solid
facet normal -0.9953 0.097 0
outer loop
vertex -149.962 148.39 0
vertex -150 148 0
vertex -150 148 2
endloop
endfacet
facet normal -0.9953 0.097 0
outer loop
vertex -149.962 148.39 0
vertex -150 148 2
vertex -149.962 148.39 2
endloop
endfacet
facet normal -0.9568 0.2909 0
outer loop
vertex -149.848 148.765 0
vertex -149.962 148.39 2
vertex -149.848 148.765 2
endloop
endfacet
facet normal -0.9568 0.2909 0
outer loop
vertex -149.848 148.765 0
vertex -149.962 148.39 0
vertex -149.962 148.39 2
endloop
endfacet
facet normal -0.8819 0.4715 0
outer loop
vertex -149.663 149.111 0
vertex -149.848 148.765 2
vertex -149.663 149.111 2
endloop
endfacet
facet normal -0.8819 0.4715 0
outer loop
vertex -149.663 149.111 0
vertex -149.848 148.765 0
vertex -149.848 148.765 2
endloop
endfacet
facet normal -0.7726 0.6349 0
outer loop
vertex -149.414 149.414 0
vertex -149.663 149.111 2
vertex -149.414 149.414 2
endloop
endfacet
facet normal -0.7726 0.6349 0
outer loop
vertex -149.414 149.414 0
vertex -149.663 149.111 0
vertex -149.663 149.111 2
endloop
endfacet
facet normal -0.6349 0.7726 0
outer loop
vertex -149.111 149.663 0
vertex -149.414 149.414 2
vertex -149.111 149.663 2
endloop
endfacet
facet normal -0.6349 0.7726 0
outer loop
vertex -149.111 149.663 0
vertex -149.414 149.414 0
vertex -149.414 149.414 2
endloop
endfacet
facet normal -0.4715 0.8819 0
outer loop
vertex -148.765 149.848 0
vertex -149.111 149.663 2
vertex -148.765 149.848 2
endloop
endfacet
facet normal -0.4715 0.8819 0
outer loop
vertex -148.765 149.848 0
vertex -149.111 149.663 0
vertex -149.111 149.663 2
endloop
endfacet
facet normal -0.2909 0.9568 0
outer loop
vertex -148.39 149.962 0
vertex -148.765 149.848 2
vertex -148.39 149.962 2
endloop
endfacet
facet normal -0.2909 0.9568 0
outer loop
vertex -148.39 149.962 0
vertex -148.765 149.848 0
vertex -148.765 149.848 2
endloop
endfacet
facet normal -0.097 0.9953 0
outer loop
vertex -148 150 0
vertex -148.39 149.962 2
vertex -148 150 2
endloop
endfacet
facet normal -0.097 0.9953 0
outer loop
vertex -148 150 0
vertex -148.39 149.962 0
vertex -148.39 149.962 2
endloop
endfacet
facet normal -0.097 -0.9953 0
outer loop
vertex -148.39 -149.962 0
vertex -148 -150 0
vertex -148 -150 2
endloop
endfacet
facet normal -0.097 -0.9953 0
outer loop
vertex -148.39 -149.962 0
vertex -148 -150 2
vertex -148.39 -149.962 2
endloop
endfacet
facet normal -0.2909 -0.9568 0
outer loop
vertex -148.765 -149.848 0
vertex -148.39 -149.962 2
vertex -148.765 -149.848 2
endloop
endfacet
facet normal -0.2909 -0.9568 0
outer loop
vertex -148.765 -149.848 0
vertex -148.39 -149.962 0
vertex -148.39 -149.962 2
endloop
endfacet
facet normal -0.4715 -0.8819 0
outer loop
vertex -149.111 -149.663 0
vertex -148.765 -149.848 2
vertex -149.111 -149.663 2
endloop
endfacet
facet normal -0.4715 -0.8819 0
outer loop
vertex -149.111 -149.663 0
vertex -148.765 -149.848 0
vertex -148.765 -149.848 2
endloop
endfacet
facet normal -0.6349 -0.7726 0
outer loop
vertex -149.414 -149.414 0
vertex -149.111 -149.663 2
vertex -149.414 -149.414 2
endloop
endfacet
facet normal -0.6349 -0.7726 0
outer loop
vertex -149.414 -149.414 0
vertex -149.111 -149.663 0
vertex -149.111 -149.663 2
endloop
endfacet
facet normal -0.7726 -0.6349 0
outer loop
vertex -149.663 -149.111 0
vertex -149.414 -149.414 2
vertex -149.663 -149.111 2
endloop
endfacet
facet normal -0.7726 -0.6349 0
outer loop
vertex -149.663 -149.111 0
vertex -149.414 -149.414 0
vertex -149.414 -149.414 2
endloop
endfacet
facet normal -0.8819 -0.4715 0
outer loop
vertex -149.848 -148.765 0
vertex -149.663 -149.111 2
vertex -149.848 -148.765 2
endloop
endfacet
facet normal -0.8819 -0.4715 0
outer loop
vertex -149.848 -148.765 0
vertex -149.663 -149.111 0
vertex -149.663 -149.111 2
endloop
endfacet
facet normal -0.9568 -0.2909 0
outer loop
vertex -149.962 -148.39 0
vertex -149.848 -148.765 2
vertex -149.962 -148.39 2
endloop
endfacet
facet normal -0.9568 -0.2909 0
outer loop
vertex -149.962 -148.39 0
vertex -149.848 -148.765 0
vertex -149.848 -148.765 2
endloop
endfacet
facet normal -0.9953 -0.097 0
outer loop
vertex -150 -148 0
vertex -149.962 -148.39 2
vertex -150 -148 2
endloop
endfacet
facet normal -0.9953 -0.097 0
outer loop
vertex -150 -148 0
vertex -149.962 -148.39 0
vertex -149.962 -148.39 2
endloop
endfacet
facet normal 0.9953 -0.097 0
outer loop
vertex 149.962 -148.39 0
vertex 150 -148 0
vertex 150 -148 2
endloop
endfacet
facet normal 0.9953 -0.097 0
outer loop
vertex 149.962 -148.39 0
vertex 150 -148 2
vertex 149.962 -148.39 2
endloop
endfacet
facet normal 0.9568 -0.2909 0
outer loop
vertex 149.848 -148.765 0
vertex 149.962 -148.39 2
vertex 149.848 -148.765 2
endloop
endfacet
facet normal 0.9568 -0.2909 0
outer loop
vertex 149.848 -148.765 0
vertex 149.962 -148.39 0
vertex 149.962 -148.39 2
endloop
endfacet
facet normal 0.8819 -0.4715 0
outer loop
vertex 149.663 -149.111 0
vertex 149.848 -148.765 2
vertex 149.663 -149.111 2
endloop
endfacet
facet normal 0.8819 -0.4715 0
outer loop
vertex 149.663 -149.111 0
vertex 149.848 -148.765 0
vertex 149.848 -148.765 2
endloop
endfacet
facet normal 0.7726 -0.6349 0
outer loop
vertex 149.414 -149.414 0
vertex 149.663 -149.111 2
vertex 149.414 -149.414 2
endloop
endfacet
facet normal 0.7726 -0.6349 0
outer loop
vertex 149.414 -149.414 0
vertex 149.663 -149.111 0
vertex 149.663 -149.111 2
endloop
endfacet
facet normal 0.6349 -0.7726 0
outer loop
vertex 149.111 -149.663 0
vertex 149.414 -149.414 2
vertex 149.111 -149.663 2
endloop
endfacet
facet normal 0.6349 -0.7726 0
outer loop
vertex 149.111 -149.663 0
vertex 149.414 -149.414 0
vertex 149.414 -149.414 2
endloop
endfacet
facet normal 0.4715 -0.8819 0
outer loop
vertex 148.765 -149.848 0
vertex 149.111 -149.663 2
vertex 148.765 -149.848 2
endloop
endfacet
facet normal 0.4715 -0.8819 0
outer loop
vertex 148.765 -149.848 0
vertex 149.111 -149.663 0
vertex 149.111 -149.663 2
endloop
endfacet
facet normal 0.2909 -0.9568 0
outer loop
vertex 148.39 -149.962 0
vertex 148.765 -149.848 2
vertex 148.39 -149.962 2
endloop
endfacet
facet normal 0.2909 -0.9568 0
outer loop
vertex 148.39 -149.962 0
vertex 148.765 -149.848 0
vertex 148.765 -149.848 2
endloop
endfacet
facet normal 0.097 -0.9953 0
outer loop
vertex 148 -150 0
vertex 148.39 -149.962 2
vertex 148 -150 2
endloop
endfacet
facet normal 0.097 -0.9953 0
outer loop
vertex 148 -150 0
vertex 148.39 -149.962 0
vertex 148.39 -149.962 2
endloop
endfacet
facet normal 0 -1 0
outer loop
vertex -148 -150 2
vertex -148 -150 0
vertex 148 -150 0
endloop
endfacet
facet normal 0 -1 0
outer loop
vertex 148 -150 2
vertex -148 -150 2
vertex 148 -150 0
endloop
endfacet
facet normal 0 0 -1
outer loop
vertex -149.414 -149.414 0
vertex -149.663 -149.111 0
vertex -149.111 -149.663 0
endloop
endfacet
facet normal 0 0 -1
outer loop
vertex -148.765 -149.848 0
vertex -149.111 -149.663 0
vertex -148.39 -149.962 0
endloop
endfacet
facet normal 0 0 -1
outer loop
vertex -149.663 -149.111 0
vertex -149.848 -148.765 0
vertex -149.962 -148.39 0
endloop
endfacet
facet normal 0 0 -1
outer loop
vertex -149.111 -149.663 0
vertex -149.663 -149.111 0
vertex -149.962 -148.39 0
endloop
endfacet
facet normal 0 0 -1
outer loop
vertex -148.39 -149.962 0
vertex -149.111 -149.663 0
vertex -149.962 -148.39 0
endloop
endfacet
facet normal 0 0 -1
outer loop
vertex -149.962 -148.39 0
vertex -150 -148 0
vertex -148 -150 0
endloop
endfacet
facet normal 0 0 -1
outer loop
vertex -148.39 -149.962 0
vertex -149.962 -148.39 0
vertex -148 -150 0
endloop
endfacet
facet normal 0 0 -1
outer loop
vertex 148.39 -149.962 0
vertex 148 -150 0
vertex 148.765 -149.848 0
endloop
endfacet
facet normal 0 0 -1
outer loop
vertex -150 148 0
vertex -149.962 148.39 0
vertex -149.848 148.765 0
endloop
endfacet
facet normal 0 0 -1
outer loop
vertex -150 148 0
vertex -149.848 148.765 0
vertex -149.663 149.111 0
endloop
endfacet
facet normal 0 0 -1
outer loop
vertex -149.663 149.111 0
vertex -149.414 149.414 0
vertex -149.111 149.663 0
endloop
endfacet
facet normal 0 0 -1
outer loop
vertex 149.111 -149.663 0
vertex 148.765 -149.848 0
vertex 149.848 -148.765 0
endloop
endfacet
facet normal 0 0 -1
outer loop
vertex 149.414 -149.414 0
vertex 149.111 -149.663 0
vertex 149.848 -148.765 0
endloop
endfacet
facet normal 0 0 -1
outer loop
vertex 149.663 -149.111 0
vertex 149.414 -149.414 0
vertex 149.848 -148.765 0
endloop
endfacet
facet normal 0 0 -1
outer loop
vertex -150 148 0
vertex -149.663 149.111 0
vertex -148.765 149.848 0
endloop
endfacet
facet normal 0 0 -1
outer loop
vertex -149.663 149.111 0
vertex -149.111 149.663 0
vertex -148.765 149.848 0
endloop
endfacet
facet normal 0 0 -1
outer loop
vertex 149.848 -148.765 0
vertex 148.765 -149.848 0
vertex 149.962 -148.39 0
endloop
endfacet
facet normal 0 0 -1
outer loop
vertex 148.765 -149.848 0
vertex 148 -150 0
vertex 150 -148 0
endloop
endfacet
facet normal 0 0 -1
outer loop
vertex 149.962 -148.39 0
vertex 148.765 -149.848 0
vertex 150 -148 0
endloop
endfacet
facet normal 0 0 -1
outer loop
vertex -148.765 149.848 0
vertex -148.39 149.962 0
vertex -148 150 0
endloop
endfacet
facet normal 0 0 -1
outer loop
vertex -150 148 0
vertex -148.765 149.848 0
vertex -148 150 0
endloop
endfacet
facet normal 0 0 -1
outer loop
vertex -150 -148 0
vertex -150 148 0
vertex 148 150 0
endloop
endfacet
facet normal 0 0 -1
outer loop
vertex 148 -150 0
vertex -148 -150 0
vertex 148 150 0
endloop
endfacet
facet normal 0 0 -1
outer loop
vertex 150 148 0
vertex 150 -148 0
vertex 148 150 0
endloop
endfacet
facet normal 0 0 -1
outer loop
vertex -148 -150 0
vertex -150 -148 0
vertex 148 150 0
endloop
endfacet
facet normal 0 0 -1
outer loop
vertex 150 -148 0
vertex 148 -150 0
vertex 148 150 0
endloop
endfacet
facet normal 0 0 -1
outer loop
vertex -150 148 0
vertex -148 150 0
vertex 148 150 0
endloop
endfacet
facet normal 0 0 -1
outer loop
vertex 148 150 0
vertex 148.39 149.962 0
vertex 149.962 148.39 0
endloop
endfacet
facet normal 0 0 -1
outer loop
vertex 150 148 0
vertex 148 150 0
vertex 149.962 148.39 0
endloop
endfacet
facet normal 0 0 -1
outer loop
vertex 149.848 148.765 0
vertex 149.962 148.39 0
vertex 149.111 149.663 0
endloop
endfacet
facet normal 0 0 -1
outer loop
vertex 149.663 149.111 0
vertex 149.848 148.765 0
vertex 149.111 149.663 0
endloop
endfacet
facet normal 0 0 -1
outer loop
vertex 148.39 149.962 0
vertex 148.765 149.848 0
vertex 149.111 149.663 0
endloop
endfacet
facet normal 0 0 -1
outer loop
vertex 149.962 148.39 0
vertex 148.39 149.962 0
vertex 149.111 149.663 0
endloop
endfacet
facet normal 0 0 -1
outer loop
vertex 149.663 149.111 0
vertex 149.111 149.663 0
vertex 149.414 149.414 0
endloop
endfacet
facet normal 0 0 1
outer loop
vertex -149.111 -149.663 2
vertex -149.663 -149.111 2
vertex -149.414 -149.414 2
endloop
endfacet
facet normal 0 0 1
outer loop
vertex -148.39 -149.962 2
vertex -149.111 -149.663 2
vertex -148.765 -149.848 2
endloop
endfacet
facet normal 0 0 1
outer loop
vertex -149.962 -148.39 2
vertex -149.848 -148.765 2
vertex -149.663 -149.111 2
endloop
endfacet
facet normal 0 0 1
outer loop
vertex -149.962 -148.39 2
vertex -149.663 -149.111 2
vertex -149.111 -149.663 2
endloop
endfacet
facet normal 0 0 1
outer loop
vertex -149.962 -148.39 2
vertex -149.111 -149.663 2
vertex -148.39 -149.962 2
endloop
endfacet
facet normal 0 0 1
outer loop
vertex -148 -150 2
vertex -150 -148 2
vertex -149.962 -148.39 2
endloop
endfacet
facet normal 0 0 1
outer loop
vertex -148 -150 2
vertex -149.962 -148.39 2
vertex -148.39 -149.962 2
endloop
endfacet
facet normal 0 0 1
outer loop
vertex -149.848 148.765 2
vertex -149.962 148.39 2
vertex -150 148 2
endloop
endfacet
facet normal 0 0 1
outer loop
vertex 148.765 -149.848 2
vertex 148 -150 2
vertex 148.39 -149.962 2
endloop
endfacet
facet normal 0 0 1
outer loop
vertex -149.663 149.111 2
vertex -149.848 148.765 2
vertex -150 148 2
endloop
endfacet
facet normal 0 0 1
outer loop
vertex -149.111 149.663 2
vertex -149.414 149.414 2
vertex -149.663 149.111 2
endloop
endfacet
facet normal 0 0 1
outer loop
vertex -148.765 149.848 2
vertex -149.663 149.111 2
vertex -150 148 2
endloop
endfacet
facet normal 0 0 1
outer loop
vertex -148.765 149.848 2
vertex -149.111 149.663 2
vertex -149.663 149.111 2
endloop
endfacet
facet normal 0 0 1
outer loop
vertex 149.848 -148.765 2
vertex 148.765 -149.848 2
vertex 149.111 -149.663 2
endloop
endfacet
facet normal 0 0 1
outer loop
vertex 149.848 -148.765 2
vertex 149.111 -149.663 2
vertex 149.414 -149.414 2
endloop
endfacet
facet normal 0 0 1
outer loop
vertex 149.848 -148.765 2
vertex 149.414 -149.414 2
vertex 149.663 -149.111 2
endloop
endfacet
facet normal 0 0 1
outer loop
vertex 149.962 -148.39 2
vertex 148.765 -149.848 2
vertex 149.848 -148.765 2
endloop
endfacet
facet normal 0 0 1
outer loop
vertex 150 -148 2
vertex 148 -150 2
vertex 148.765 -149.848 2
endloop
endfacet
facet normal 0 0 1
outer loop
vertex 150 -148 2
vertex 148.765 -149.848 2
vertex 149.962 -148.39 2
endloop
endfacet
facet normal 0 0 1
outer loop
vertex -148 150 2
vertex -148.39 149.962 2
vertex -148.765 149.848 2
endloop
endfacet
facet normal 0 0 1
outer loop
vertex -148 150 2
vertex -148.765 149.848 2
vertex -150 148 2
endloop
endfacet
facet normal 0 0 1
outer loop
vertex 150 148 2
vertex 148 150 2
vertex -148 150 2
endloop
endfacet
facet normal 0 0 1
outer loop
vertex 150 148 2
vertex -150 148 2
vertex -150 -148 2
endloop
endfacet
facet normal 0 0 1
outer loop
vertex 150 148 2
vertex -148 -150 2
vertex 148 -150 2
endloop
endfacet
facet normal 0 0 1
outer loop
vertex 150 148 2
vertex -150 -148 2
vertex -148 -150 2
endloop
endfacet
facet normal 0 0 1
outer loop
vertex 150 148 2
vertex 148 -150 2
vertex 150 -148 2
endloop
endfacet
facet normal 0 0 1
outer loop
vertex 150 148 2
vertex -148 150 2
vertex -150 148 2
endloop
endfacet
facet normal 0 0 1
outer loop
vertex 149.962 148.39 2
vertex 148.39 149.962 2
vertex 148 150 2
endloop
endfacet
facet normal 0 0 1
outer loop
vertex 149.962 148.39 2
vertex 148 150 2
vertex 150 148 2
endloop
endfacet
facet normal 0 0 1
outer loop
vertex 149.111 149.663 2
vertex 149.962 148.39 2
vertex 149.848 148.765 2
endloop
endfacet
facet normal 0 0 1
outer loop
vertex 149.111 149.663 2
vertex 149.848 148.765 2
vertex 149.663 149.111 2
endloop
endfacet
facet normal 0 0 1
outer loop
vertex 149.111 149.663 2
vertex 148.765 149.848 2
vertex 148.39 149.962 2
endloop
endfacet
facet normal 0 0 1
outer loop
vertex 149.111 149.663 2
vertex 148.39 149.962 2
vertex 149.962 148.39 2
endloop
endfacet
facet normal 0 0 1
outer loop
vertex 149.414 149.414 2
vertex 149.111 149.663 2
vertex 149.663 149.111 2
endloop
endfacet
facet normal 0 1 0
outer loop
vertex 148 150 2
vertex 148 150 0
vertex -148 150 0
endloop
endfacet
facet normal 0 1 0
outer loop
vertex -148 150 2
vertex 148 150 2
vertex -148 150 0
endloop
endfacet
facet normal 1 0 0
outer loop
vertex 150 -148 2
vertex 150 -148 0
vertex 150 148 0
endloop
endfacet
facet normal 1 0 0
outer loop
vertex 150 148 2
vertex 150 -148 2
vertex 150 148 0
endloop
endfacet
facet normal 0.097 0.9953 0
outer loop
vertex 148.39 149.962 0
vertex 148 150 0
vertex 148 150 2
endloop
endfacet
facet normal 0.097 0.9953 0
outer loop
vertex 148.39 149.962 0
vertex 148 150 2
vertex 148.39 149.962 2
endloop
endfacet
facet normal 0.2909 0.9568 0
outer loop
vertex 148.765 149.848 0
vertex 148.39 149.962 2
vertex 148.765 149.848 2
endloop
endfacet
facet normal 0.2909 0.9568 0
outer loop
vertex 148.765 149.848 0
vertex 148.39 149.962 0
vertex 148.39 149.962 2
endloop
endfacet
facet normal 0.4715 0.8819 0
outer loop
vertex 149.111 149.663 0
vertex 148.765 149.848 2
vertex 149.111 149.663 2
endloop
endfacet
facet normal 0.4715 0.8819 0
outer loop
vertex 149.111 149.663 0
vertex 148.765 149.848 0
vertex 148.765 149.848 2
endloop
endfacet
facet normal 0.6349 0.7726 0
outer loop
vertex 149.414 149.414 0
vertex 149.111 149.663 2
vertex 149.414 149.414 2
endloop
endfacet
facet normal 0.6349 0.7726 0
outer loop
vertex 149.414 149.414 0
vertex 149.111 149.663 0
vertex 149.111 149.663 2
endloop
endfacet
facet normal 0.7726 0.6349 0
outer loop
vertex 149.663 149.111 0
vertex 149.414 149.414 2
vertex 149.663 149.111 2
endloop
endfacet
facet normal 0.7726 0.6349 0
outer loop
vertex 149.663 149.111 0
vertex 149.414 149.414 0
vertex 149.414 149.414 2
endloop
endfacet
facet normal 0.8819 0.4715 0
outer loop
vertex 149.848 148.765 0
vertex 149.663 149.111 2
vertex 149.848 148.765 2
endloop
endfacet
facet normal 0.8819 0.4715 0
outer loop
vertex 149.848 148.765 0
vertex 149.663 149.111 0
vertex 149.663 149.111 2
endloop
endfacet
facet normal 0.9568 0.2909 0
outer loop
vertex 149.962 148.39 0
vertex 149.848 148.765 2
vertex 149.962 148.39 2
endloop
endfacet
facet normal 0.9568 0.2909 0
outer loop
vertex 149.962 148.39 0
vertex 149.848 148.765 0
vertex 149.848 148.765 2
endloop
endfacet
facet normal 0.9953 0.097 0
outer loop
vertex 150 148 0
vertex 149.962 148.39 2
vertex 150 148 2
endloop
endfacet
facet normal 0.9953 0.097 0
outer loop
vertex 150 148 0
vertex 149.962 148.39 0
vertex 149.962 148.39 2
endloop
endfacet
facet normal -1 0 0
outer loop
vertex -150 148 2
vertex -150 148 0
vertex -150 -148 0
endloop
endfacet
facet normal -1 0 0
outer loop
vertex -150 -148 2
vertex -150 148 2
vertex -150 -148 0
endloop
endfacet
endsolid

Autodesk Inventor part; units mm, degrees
ref_plane "YZ Plane" through (0, 0, 0) normal (1, 0, 0) x (0, 1, 0)
ref_plane "XZ Plane" through (0, 0, 0) normal (0, 1, 0) x (-1, 0, 0)
ref_plane "XY Plane" through (0, 0, 0) normal (0, 0, 1) x (1, 0, 0)
sketch "Skizze1" plane through (0, 0, 0) normal (0, 0, 1) x (1, 0, 0)
  line L0 (-148, -150) -> (148, -150)
  line L1 (150, -148) -> (150, 148)
  line L2 (148, 150) -> (-148, 150)
  line L3 (-150, 148) -> (-150, -148)
  line L4 (-150, -150) -> (150, 150) construction
  line L5 (150, -150) -> (-150, 150) construction
  arc A0 (-148, 150) -> (-150, 148) centre (-148, 148) ccw
  arc A1 (150, 148) -> (148, 150) centre (148, 148) ccw
  arc A2 (148, -150) -> (150, -148) centre (148, -148) ccw
  arc A3 (-150, -148) -> (-148, -150) centre (-148, -148) ccw
  point P0 (0, 0)
  dimension "d0" = 300
  dimension "d1" = 300
  dimension "d4" = 2
extrude "Extrusion1" add sketch "Skizze1" along normal blind 2
properties part number "silicone heater" material "Kautschuk"
